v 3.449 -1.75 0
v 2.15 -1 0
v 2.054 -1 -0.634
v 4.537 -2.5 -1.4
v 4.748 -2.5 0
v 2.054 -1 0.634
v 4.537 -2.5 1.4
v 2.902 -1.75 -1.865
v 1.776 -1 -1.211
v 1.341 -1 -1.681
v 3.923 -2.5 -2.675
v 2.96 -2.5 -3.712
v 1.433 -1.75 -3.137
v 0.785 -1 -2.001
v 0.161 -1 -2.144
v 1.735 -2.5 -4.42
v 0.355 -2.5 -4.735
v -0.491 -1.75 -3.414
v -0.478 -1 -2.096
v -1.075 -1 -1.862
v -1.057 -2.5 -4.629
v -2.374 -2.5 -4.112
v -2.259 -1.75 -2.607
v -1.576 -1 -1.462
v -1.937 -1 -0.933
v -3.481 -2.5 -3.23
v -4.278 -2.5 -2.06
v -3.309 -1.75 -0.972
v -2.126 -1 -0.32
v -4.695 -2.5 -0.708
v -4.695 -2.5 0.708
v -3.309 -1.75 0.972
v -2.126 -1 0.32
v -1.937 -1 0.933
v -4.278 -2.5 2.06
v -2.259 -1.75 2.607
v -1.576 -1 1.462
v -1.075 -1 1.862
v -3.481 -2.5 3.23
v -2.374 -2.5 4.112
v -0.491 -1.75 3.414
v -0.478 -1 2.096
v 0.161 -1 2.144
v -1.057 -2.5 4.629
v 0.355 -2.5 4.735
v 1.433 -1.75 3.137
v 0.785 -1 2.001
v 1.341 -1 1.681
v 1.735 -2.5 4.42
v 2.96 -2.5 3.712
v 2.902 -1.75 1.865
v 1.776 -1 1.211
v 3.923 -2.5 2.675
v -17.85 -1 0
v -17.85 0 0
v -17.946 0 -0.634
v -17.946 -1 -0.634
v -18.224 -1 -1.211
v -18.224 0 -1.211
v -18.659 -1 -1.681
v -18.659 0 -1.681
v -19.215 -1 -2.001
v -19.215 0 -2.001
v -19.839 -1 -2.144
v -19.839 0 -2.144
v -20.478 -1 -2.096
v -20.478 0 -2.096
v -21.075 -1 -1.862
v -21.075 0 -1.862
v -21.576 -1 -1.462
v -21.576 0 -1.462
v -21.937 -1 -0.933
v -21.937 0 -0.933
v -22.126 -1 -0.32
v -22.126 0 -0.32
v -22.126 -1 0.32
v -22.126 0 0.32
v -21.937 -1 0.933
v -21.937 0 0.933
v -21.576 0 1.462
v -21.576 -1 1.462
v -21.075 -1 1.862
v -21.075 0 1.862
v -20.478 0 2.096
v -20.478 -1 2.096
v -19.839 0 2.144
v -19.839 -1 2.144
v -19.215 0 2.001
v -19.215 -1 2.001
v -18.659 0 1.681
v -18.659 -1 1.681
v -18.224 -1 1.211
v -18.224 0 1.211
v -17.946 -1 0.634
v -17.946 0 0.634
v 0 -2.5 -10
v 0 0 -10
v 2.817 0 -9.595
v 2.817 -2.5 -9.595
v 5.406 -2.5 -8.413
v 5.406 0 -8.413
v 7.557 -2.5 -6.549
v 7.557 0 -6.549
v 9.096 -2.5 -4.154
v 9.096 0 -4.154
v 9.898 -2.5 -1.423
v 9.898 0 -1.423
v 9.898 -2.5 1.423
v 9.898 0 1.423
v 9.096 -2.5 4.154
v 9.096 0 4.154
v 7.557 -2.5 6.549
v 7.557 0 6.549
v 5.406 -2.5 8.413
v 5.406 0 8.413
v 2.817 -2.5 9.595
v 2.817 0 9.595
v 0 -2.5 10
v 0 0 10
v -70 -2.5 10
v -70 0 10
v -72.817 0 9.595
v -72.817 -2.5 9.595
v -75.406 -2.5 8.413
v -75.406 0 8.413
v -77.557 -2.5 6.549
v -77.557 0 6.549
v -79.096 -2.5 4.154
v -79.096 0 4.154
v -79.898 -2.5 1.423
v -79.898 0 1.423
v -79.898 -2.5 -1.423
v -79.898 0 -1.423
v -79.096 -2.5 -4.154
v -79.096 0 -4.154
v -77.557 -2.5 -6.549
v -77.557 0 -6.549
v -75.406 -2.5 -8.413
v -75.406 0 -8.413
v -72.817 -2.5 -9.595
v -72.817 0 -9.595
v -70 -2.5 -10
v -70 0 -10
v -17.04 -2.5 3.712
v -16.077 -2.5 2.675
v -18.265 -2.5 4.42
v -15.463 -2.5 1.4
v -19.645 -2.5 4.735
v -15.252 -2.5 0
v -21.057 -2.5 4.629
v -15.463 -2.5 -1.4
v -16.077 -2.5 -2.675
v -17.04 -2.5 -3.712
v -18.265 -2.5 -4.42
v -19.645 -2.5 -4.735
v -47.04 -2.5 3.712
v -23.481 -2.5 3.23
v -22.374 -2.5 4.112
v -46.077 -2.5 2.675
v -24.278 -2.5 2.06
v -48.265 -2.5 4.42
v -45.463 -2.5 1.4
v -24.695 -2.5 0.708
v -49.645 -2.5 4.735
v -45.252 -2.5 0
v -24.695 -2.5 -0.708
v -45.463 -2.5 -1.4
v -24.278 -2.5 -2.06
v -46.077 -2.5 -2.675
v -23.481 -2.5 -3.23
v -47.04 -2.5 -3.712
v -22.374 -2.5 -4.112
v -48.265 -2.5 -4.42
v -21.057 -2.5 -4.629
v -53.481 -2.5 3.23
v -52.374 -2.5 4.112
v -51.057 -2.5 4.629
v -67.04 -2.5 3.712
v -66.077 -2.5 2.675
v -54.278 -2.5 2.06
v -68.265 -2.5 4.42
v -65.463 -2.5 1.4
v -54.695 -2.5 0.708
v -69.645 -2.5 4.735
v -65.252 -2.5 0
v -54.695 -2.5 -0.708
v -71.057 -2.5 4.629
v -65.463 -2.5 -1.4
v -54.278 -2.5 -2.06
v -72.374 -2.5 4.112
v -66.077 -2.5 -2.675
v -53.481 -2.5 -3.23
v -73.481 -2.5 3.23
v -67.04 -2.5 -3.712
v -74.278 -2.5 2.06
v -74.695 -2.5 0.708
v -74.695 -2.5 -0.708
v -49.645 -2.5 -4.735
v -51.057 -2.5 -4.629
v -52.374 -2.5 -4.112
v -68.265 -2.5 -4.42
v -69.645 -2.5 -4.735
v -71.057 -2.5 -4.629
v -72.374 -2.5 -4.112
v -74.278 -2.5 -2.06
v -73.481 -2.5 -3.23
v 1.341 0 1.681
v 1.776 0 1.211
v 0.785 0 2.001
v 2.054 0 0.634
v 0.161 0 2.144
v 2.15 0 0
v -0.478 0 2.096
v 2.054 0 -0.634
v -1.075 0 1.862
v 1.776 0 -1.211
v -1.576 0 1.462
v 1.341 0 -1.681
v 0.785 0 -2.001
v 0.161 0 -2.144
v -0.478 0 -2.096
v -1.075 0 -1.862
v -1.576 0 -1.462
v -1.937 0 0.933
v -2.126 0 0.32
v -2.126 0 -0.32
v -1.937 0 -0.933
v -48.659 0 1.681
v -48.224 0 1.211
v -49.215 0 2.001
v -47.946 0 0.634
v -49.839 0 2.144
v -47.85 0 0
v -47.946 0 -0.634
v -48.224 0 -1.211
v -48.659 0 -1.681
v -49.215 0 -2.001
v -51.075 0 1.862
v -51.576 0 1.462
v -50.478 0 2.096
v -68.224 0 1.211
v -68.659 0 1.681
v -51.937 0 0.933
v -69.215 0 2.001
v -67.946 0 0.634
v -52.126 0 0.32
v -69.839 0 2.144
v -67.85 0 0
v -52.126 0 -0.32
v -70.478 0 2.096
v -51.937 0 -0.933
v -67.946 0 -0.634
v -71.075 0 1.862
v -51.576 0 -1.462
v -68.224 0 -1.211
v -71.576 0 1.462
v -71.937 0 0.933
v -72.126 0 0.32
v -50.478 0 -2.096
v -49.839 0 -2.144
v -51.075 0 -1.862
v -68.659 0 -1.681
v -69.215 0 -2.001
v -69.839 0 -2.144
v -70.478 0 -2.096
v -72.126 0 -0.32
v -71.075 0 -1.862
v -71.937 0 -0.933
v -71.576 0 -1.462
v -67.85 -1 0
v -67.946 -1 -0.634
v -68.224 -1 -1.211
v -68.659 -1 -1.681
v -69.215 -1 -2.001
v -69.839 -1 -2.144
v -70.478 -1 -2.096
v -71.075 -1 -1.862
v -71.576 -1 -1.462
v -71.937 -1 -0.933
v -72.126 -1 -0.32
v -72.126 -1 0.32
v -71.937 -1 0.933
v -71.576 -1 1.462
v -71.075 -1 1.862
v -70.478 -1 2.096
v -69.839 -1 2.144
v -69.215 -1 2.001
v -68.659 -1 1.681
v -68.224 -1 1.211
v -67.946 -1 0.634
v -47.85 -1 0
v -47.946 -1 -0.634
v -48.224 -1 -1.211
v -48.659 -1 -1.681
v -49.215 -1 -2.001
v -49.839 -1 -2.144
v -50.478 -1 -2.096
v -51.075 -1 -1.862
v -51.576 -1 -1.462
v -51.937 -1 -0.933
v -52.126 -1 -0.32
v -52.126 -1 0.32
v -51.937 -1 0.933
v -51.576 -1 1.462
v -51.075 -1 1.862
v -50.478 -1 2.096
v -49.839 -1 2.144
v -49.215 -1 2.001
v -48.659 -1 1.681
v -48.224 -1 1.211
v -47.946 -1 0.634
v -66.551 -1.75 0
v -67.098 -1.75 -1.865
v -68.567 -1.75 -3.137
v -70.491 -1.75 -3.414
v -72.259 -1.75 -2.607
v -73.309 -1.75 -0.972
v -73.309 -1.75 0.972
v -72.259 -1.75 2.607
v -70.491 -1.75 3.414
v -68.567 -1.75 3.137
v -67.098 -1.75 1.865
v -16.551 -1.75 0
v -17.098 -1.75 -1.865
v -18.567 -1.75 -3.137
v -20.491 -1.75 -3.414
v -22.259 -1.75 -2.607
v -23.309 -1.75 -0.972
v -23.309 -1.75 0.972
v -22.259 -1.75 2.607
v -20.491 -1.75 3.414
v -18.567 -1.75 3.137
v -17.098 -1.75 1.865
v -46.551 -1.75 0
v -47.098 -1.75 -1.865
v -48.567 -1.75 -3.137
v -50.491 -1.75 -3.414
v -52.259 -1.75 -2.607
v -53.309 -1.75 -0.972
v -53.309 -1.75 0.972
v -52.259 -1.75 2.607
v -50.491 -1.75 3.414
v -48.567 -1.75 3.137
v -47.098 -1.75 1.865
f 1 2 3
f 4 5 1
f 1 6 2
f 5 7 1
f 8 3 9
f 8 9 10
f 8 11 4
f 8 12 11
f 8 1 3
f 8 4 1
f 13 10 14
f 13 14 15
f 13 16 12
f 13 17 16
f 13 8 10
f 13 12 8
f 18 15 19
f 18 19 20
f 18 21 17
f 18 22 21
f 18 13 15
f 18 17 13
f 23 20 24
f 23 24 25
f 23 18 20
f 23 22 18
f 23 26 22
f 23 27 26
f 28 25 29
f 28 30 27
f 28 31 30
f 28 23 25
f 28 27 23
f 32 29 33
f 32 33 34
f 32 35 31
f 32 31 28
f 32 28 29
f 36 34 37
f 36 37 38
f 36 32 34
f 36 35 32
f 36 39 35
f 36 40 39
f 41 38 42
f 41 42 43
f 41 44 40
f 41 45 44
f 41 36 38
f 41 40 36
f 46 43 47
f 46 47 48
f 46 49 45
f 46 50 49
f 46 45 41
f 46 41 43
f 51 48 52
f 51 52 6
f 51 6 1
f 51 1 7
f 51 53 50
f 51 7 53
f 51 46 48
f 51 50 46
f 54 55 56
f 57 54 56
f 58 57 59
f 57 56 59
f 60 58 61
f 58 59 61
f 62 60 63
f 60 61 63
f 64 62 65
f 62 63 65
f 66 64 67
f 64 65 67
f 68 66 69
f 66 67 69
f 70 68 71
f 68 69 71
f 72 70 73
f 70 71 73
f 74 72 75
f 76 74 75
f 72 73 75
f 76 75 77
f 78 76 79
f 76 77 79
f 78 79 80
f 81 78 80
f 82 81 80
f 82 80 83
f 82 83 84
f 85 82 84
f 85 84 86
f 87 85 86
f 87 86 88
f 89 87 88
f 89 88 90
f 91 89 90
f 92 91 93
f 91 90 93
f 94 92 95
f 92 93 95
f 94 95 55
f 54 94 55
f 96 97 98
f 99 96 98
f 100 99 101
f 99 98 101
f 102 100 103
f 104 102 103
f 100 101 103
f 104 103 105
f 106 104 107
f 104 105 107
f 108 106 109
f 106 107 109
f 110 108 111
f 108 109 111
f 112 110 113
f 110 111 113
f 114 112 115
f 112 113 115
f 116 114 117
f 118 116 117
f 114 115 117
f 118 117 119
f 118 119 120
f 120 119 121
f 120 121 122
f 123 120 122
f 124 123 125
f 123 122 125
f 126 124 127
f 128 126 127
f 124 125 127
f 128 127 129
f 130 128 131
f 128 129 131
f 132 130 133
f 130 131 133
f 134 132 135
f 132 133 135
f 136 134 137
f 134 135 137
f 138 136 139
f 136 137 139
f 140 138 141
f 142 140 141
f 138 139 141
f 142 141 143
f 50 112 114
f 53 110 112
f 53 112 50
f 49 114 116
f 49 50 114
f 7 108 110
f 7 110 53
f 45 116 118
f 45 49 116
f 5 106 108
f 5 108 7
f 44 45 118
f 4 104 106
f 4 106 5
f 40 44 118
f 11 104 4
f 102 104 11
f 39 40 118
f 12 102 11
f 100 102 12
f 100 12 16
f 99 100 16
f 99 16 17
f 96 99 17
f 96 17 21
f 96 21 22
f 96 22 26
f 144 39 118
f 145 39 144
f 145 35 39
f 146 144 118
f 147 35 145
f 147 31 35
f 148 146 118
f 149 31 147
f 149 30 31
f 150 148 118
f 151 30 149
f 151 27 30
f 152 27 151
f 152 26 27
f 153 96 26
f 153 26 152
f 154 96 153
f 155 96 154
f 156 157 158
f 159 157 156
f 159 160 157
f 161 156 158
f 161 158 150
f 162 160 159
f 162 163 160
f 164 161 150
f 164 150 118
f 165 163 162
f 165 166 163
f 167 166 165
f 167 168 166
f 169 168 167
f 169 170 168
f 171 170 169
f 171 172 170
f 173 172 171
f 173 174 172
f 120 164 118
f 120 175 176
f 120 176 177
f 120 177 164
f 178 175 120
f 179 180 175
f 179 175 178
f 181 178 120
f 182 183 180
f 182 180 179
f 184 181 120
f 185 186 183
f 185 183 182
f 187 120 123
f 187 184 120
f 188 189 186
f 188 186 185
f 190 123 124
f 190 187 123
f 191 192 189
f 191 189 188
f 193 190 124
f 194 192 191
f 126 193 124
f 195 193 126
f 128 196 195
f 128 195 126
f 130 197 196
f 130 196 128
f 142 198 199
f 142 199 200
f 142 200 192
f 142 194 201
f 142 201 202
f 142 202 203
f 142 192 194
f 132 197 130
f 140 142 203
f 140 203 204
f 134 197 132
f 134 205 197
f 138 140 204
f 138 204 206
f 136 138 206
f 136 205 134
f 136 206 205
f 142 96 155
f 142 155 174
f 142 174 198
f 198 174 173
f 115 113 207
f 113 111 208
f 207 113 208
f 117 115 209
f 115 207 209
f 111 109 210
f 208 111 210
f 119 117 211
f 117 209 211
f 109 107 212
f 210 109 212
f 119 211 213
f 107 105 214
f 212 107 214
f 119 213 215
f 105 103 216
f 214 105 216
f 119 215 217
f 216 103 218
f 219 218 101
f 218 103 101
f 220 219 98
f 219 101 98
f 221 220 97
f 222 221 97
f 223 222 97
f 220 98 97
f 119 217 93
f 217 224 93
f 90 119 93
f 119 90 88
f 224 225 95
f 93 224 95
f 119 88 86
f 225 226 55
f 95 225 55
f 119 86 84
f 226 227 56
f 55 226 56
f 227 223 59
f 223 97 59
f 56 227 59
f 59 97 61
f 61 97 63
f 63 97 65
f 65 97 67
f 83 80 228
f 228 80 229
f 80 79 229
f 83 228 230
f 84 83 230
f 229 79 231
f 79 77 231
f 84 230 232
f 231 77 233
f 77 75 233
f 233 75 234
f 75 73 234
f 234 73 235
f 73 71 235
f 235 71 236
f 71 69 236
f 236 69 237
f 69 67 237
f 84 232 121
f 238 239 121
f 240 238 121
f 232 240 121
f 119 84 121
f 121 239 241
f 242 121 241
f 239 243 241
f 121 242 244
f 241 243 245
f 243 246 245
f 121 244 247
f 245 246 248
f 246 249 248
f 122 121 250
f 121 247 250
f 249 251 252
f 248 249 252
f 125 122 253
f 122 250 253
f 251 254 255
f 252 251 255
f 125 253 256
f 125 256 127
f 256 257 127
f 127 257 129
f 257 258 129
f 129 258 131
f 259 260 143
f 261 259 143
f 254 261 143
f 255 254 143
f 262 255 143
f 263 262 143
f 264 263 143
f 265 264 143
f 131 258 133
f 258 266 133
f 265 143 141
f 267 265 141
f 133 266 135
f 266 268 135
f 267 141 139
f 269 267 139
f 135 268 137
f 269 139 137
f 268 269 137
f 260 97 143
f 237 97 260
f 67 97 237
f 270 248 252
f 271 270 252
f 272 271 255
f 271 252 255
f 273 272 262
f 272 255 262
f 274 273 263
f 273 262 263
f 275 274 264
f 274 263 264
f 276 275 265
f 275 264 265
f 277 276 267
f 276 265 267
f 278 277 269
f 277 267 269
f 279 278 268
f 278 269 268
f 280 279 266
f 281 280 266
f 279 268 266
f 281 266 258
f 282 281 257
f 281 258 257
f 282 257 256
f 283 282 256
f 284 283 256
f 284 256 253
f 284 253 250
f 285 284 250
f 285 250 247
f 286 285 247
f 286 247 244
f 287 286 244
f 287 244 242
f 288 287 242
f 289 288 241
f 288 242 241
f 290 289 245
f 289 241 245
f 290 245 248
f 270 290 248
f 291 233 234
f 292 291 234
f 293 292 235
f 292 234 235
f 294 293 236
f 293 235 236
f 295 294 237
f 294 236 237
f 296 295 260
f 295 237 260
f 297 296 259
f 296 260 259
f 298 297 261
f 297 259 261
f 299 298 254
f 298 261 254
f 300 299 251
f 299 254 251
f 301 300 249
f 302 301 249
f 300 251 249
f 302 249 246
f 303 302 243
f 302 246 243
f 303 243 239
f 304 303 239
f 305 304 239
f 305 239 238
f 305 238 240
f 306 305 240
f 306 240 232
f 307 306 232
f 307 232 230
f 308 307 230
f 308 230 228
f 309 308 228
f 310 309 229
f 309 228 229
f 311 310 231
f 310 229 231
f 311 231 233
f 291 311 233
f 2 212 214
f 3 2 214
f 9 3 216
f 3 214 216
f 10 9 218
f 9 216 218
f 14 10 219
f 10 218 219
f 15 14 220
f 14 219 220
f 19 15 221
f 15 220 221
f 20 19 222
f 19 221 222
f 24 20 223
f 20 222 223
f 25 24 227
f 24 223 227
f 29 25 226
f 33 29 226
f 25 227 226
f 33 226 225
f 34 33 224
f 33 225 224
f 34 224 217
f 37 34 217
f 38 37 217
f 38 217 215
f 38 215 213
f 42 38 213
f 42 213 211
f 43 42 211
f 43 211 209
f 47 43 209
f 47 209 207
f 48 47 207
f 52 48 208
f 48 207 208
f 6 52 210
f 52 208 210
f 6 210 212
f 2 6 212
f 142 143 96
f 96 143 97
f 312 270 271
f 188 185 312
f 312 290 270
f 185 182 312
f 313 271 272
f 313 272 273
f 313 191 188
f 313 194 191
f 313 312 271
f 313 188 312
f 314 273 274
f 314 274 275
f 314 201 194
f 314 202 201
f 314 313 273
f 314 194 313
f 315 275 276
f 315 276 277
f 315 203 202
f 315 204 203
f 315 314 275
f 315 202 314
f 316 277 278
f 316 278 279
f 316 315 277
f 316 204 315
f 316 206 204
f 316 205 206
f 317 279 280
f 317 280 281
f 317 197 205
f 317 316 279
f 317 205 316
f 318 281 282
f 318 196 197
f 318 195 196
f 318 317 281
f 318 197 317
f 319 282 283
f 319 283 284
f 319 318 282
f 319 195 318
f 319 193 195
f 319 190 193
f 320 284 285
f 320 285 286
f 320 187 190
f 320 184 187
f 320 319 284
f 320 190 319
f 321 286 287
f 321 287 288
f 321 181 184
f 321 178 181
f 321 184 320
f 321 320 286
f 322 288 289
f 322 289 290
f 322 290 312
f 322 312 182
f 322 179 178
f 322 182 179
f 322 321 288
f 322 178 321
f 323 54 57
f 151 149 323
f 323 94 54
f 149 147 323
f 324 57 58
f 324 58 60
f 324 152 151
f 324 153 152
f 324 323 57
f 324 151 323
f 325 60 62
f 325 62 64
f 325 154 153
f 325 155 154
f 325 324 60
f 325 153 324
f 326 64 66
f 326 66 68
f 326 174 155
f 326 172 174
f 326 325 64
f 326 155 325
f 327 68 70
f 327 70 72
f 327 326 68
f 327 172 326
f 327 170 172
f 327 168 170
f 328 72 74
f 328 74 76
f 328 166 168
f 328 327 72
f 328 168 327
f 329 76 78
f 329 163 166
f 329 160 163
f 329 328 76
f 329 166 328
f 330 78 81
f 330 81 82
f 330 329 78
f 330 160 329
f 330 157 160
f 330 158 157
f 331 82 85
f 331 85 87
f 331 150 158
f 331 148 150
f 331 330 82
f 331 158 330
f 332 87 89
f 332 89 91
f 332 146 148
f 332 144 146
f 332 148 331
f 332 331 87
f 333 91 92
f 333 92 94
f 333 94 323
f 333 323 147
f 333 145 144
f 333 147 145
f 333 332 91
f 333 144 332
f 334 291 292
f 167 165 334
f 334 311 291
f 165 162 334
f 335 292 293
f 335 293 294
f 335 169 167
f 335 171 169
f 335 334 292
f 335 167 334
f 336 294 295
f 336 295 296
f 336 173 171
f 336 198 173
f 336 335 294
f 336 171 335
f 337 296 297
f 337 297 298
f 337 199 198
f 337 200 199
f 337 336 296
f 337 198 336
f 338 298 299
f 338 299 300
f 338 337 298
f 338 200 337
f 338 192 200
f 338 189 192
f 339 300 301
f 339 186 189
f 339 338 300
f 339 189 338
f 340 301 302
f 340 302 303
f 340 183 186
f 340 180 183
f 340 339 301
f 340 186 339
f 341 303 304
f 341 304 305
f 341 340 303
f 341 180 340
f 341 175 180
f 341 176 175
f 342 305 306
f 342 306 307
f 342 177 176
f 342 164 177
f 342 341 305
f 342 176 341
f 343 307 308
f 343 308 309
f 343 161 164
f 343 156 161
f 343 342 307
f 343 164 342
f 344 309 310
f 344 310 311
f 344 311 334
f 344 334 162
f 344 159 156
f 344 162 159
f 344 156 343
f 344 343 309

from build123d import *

# Parameters (mm, degrees)
SKETCH1_R             = 2.15
BOSS_EXTRUDE1_DEPTH   = 2.5
CHAMFER1_SIZE         = 1.5
CHAMFER1_SIZE2        = 2.598076211
CHAMFER1_PART_2_SIZE  = 1.5
CHAMFER1_PART_2_SIZE2 = 2.598076211
CHAMFER1_PART_3_SIZE  = 1.5
CHAMFER1_PART_3_SIZE2 = 2.598076211
CHAMFER1_PART_4_SIZE  = 1.5
CHAMFER1_PART_4_SIZE2 = 2.598076211


with BuildPart() as part:
    # Sketch1 → Boss-Extrude1 (new body)
    with BuildSketch(Plane(origin=(0, 0, 0), x_dir=(1, 0, 0), z_dir=(0, 1, 0))):
        with BuildLine():
            Line((0, -10), (-70, -10))
            ThreePointArc((-70, -10), (-80, 0), (-70, 10))
            Line((-70, 10), (0, 10))
            ThreePointArc((0, 10), (10, 0), (0, -10))
        make_face()
        Circle(SKETCH1_R, mode=Mode.SUBTRACT)
        with Locations((-70, 0)):
            Circle(SKETCH1_R, mode=Mode.SUBTRACT)
        with Locations((-20, 0)):
            Circle(SKETCH1_R, mode=Mode.SUBTRACT)
        with Locations((-50, 0)):
            Circle(SKETCH1_R, mode=Mode.SUBTRACT)
    extrude(amount=-BOSS_EXTRUDE1_DEPTH)

    # Chamfer1
    chamfer1_edges = [part.edges().sort_by_distance(p)[0] for p in [
        (-2.15, -2.5, 0),
    ]]
    chamfer1_side = [part.faces().sort_by_distance(p)[0] for p in [
        (-2.15, -1.25, 0),
    ]]
    chamfer(chamfer1_edges, length=CHAMFER1_SIZE, length2=CHAMFER1_SIZE2, reference=chamfer1_side[0])

    # Chamfer1 part 2
    chamfer1_part_2_edges = [part.edges().sort_by_distance(p)[0] for p in [
        (-72.15, -2.5, 0),
    ]]
    chamfer1_part_2_side = [part.faces().sort_by_distance(p)[0] for p in [
        (-72.15, -1.25, 0),
    ]]
    chamfer(chamfer1_part_2_edges, length=CHAMFER1_PART_2_SIZE, length2=CHAMFER1_PART_2_SIZE2, reference=chamfer1_part_2_side[0])

    # Chamfer1 part 3
    chamfer1_part_3_edges = [part.edges().sort_by_distance(p)[0] for p in [
        (-22.15, -2.5, 0),
    ]]
    chamfer1_part_3_side = [part.faces().sort_by_distance(p)[0] for p in [
        (-22.15, -1.25, 0),
    ]]
    chamfer(chamfer1_part_3_edges, length=CHAMFER1_PART_3_SIZE, length2=CHAMFER1_PART_3_SIZE2, reference=chamfer1_part_3_side[0])

    # Chamfer1 part 4
    chamfer1_part_4_edges = [part.edges().sort_by_distance(p)[0] for p in [
        (-52.15, -2.5, 0),
    ]]
    chamfer1_part_4_side = [part.faces().sort_by_distance(p)[0] for p in [
        (-52.15, -1.25, 0),
    ]]
    chamfer(chamfer1_part_4_edges, length=CHAMFER1_PART_4_SIZE, length2=CHAMFER1_PART_4_SIZE2, reference=chamfer1_part_4_side[0])


solid = part.part
